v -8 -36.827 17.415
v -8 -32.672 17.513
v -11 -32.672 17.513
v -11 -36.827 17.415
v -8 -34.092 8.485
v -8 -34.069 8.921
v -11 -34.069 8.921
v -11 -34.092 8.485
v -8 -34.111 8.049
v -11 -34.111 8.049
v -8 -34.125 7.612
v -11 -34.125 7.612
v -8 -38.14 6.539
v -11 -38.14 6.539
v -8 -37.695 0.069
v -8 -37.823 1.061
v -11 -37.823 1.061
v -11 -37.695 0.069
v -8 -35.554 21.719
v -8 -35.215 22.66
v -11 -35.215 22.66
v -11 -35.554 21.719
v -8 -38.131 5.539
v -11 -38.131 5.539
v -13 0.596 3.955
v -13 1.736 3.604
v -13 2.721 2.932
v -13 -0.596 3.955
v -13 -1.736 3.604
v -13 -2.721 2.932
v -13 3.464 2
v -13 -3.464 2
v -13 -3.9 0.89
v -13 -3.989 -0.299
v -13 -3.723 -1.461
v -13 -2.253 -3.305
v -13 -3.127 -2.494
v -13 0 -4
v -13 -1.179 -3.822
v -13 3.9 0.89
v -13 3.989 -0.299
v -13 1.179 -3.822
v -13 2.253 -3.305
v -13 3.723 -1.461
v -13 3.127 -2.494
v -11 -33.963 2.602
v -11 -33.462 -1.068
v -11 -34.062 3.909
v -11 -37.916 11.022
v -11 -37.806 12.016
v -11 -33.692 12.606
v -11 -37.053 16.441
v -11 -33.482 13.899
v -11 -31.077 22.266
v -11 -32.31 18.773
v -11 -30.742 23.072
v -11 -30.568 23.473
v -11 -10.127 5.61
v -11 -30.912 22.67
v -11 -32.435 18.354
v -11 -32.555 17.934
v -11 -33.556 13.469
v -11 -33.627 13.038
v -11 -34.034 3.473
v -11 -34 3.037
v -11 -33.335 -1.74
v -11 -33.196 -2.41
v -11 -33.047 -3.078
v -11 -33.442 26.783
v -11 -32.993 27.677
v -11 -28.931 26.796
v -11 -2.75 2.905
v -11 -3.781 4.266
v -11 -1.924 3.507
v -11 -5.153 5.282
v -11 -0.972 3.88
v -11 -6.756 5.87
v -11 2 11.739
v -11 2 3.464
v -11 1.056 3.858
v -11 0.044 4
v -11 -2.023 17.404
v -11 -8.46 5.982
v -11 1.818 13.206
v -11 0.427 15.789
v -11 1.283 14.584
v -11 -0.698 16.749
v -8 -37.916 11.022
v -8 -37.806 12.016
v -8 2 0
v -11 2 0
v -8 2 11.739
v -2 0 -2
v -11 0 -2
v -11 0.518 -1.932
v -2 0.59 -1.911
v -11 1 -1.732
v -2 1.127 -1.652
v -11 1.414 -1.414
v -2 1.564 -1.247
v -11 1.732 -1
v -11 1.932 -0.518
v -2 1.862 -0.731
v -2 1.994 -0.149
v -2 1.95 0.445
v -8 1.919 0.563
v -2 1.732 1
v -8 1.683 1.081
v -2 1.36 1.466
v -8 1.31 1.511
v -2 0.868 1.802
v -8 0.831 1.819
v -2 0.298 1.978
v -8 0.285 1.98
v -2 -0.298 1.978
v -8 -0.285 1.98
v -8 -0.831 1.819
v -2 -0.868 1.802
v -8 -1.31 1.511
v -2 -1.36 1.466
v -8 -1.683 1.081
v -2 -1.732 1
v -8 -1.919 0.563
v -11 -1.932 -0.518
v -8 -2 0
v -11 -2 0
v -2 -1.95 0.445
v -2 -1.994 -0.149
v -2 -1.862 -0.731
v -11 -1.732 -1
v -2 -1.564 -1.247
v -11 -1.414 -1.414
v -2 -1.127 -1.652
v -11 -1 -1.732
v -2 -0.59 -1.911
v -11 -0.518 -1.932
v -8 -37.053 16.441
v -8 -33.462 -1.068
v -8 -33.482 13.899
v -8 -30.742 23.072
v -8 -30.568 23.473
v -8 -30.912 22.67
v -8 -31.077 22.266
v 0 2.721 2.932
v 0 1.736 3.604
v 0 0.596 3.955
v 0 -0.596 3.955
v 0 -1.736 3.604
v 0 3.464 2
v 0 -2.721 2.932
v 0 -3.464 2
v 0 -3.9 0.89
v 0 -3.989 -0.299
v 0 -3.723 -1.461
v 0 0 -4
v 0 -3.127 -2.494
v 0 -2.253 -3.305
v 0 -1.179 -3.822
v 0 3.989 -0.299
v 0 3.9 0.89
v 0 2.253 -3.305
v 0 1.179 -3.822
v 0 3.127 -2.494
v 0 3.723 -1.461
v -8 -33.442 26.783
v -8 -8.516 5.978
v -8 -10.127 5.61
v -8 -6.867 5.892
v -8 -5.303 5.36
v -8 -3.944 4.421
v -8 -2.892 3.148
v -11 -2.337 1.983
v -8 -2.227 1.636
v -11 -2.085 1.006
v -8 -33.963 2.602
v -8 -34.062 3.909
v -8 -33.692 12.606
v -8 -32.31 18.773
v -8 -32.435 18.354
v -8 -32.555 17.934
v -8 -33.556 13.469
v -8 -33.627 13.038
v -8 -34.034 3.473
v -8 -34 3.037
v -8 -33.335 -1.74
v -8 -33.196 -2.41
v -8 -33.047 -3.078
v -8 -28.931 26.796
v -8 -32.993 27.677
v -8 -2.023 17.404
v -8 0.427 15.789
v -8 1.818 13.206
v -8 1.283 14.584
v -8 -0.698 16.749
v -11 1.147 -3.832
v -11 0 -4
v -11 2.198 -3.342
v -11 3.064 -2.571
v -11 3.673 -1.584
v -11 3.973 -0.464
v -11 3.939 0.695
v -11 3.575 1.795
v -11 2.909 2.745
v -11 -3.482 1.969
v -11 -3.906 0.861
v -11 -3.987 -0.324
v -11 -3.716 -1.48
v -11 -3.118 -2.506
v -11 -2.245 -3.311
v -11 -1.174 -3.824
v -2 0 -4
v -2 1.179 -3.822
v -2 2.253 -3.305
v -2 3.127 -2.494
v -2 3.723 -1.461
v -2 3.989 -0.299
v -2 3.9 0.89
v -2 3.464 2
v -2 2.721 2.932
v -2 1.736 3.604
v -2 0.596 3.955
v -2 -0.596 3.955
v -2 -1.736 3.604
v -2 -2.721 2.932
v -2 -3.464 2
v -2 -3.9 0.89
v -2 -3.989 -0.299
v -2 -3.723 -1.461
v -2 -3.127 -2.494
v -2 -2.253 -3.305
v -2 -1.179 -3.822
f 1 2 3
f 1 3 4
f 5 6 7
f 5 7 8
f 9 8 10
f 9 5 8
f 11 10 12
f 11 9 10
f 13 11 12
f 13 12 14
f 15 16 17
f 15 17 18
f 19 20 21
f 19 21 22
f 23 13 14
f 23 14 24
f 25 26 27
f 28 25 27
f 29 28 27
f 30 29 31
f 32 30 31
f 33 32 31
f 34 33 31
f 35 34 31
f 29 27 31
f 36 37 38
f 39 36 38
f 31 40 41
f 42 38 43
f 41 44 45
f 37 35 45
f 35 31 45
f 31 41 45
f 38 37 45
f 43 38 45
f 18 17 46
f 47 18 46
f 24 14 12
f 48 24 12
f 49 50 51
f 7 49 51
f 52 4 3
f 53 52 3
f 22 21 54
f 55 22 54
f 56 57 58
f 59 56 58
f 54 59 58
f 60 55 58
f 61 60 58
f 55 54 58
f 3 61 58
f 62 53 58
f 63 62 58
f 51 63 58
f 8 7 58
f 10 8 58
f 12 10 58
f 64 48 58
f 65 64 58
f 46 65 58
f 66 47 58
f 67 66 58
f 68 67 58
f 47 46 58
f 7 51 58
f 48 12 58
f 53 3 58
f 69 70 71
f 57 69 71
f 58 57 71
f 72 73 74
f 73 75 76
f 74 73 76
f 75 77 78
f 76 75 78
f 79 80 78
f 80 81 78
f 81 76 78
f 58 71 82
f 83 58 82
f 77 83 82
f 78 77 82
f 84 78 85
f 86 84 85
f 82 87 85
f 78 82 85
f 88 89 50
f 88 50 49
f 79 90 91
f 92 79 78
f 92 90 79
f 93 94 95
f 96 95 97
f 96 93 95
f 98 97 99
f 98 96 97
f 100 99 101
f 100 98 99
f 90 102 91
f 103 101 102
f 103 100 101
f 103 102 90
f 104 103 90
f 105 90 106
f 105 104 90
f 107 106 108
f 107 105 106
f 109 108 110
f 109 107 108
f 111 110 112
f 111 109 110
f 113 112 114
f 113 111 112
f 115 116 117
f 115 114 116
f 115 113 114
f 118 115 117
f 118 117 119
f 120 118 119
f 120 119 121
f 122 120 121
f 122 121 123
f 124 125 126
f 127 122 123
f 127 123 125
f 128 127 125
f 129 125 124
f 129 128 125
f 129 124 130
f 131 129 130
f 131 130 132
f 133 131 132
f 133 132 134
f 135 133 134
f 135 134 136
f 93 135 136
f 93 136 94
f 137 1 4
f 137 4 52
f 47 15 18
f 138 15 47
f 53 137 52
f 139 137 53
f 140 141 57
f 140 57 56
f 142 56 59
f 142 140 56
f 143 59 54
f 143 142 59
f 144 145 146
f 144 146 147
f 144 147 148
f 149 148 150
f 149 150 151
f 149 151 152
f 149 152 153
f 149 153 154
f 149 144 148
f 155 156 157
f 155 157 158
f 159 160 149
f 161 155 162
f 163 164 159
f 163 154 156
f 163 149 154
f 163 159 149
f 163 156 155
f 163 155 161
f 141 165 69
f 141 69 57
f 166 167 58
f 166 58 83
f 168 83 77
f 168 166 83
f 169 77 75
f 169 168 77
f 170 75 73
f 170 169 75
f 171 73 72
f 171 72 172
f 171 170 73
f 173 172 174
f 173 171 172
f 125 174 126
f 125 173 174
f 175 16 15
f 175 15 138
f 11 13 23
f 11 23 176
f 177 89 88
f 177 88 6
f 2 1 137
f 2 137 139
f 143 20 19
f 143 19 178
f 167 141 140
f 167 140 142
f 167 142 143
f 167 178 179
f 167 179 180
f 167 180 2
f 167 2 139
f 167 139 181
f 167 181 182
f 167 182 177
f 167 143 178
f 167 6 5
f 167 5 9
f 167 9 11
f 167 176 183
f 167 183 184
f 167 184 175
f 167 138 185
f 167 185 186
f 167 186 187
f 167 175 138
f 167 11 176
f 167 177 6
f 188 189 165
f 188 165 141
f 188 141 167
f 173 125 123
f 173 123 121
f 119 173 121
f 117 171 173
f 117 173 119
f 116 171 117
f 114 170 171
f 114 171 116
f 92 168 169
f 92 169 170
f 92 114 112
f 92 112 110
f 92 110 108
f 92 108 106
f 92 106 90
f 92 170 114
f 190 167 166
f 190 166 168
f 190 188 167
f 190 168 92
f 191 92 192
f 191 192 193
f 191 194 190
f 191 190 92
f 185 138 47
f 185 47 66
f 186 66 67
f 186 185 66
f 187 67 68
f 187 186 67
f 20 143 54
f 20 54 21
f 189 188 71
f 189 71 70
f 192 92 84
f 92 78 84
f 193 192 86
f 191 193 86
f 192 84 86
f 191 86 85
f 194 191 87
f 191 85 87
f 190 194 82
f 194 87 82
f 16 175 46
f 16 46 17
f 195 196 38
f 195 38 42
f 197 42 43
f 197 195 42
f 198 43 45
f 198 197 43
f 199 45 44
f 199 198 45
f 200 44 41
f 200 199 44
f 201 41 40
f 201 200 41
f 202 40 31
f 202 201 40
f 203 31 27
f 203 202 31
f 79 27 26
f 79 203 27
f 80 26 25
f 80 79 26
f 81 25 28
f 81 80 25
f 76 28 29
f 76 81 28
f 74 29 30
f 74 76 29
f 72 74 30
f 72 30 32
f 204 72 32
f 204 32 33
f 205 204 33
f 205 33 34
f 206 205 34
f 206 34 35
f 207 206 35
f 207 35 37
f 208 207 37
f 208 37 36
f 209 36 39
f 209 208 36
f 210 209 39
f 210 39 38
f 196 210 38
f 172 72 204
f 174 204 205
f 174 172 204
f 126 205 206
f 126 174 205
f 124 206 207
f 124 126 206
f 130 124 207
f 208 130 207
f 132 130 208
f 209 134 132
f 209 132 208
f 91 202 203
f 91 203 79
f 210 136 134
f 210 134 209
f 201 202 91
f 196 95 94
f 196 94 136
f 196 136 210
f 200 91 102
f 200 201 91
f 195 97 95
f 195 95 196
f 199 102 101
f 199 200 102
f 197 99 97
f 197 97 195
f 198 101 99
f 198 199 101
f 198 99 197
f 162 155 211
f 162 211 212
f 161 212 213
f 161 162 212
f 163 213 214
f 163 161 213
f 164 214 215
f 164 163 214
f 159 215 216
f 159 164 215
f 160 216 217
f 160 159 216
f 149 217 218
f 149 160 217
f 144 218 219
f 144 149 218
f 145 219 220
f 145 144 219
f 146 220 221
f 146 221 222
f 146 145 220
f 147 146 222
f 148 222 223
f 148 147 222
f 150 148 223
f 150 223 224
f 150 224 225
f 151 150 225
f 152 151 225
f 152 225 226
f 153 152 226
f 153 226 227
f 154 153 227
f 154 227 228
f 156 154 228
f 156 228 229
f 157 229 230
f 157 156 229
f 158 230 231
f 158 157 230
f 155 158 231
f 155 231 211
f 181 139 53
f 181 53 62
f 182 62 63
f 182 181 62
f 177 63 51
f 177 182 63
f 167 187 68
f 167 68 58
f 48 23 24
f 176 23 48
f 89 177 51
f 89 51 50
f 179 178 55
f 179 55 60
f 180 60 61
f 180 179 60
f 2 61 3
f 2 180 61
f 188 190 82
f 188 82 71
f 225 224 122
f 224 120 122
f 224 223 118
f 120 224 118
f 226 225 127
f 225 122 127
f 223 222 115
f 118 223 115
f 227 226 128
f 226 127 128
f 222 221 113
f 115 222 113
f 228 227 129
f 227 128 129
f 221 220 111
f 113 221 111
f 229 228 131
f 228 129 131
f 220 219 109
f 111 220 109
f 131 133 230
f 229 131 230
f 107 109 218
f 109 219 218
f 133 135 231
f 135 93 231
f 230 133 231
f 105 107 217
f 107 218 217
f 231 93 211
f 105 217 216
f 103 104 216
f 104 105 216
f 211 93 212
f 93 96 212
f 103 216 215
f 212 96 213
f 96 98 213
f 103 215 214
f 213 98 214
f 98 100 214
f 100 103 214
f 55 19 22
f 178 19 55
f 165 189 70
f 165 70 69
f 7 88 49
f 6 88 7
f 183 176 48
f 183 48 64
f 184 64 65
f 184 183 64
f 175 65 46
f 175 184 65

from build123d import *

# Parameters (mm, degrees)
SKETCH1_R           = 4
BOSS_EXTRUDE1_DEPTH = 2
BOSS_EXTRUDE2_START = -2
SKETCH1_3_R         = 2
BOSS_EXTRUDE2_DEPTH = 9
BOSS_EXTRUDE3_START = -11
SKETCH1_4_R         = 4
BOSS_EXTRUDE3_DEPTH = 2
BOSS_EXTRUDE4_START = 3
BOSS_EXTRUDE4_DEPTH = 3
FILLET1_R           = 6
BOSS_EXTRUDE5_START = 3
BOSS_EXTRUDE5_DEPTH = 3
CIRPATTERN1_COUNT   = 6
CIRPATTERN1_ANGLE   = 34


with BuildPart() as part:
    # Sketch1 → Boss-Extrude1 (new body)
    with BuildSketch(Plane.YZ):
        with Locations(Location((0, 0, 0), (0, 0, 270))):
            Circle(SKETCH1_R)
    extrude(amount=-BOSS_EXTRUDE1_DEPTH)

    # Sketch1<3> → Boss-Extrude2 (add)
    with BuildSketch(Plane.YZ.offset(BOSS_EXTRUDE2_START)):
        with Locations(Location((0, 0, 0), (0, 0, 270))):
            Circle(SKETCH1_3_R)
    extrude(amount=-BOSS_EXTRUDE2_DEPTH)

    # Sketch1<4> → Boss-Extrude3 (add)
    with BuildSketch(Plane.YZ.offset(BOSS_EXTRUDE3_START)):
        with Locations(Location((0, 0, 0), (0, 0, 270))):
            Circle(SKETCH1_4_R)
    extrude(amount=-BOSS_EXTRUDE3_DEPTH)

    # Sketch2 → Boss-Extrude4 (add)
    with BuildSketch(Plane.YZ.offset(-11).offset(BOSS_EXTRUDE4_START)):
        with BuildLine():
            Line((2, 0), (2, 16))
            Line((2, 16), (-28.931042314, 26.795547064))
            ThreePointArc((-28.931042314, 26.795547064), (-29.786171027, 25.152339202), (-30.568468217, 23.473235781))
            ThreePointArc((-30.568468217, 23.473235781), (-33.95702666, 10.398285565), (-33.047270986, -3.077952637))
            Line((-33.047270986, -3.077952637), (-10.126725467, 5.61044016))
            ThreePointArc((-10.126725467, 5.61044016), (-4.591213765, 4.937628621), (-2, 0))
            ThreePointArc((-2, 0), (0, 2), (2, 0))
        make_face()
    extrude(amount=-BOSS_EXTRUDE4_DEPTH)

    # Fillet1
    fillet1_edges = [part.edges().sort_by_distance(p)[0] for p in [
        (-9.5, 2, 16),
    ]]
    fillet(fillet1_edges, radius=FILLET1_R)

    # Sketch2<3> → Boss-Extrude5 (add)
    with BuildSketch(Plane.YZ.offset(-11).offset(BOSS_EXTRUDE5_START)):
        with BuildLine():
            ThreePointArc((-30.568468217, 23.473235781), (-29.786171027, 25.152339202), (-28.931042314, 26.795547064))
            Line((-28.931042314, 26.795547064), (-32.992813147, 27.676701657))
            Line((-32.992813147, 27.676701657), (-33.441604676, 26.783065174))
            Line((-33.441604676, 26.783065174), (-30.568468217, 23.473235781))
        make_face()
    boss_extrude5 = extrude(amount=-BOSS_EXTRUDE5_DEPTH)

    # CirPattern1: Boss-Extrude5 ×6 about axis
    cirpattern1_axis = Axis((0, 8.12, 6.47), (1, 0, 0))
    for i in range(1, CIRPATTERN1_COUNT):
        add(boss_extrude5.rotate(cirpattern1_axis, i * CIRPATTERN1_ANGLE / (CIRPATTERN1_COUNT - 1)))


solid = part.part
